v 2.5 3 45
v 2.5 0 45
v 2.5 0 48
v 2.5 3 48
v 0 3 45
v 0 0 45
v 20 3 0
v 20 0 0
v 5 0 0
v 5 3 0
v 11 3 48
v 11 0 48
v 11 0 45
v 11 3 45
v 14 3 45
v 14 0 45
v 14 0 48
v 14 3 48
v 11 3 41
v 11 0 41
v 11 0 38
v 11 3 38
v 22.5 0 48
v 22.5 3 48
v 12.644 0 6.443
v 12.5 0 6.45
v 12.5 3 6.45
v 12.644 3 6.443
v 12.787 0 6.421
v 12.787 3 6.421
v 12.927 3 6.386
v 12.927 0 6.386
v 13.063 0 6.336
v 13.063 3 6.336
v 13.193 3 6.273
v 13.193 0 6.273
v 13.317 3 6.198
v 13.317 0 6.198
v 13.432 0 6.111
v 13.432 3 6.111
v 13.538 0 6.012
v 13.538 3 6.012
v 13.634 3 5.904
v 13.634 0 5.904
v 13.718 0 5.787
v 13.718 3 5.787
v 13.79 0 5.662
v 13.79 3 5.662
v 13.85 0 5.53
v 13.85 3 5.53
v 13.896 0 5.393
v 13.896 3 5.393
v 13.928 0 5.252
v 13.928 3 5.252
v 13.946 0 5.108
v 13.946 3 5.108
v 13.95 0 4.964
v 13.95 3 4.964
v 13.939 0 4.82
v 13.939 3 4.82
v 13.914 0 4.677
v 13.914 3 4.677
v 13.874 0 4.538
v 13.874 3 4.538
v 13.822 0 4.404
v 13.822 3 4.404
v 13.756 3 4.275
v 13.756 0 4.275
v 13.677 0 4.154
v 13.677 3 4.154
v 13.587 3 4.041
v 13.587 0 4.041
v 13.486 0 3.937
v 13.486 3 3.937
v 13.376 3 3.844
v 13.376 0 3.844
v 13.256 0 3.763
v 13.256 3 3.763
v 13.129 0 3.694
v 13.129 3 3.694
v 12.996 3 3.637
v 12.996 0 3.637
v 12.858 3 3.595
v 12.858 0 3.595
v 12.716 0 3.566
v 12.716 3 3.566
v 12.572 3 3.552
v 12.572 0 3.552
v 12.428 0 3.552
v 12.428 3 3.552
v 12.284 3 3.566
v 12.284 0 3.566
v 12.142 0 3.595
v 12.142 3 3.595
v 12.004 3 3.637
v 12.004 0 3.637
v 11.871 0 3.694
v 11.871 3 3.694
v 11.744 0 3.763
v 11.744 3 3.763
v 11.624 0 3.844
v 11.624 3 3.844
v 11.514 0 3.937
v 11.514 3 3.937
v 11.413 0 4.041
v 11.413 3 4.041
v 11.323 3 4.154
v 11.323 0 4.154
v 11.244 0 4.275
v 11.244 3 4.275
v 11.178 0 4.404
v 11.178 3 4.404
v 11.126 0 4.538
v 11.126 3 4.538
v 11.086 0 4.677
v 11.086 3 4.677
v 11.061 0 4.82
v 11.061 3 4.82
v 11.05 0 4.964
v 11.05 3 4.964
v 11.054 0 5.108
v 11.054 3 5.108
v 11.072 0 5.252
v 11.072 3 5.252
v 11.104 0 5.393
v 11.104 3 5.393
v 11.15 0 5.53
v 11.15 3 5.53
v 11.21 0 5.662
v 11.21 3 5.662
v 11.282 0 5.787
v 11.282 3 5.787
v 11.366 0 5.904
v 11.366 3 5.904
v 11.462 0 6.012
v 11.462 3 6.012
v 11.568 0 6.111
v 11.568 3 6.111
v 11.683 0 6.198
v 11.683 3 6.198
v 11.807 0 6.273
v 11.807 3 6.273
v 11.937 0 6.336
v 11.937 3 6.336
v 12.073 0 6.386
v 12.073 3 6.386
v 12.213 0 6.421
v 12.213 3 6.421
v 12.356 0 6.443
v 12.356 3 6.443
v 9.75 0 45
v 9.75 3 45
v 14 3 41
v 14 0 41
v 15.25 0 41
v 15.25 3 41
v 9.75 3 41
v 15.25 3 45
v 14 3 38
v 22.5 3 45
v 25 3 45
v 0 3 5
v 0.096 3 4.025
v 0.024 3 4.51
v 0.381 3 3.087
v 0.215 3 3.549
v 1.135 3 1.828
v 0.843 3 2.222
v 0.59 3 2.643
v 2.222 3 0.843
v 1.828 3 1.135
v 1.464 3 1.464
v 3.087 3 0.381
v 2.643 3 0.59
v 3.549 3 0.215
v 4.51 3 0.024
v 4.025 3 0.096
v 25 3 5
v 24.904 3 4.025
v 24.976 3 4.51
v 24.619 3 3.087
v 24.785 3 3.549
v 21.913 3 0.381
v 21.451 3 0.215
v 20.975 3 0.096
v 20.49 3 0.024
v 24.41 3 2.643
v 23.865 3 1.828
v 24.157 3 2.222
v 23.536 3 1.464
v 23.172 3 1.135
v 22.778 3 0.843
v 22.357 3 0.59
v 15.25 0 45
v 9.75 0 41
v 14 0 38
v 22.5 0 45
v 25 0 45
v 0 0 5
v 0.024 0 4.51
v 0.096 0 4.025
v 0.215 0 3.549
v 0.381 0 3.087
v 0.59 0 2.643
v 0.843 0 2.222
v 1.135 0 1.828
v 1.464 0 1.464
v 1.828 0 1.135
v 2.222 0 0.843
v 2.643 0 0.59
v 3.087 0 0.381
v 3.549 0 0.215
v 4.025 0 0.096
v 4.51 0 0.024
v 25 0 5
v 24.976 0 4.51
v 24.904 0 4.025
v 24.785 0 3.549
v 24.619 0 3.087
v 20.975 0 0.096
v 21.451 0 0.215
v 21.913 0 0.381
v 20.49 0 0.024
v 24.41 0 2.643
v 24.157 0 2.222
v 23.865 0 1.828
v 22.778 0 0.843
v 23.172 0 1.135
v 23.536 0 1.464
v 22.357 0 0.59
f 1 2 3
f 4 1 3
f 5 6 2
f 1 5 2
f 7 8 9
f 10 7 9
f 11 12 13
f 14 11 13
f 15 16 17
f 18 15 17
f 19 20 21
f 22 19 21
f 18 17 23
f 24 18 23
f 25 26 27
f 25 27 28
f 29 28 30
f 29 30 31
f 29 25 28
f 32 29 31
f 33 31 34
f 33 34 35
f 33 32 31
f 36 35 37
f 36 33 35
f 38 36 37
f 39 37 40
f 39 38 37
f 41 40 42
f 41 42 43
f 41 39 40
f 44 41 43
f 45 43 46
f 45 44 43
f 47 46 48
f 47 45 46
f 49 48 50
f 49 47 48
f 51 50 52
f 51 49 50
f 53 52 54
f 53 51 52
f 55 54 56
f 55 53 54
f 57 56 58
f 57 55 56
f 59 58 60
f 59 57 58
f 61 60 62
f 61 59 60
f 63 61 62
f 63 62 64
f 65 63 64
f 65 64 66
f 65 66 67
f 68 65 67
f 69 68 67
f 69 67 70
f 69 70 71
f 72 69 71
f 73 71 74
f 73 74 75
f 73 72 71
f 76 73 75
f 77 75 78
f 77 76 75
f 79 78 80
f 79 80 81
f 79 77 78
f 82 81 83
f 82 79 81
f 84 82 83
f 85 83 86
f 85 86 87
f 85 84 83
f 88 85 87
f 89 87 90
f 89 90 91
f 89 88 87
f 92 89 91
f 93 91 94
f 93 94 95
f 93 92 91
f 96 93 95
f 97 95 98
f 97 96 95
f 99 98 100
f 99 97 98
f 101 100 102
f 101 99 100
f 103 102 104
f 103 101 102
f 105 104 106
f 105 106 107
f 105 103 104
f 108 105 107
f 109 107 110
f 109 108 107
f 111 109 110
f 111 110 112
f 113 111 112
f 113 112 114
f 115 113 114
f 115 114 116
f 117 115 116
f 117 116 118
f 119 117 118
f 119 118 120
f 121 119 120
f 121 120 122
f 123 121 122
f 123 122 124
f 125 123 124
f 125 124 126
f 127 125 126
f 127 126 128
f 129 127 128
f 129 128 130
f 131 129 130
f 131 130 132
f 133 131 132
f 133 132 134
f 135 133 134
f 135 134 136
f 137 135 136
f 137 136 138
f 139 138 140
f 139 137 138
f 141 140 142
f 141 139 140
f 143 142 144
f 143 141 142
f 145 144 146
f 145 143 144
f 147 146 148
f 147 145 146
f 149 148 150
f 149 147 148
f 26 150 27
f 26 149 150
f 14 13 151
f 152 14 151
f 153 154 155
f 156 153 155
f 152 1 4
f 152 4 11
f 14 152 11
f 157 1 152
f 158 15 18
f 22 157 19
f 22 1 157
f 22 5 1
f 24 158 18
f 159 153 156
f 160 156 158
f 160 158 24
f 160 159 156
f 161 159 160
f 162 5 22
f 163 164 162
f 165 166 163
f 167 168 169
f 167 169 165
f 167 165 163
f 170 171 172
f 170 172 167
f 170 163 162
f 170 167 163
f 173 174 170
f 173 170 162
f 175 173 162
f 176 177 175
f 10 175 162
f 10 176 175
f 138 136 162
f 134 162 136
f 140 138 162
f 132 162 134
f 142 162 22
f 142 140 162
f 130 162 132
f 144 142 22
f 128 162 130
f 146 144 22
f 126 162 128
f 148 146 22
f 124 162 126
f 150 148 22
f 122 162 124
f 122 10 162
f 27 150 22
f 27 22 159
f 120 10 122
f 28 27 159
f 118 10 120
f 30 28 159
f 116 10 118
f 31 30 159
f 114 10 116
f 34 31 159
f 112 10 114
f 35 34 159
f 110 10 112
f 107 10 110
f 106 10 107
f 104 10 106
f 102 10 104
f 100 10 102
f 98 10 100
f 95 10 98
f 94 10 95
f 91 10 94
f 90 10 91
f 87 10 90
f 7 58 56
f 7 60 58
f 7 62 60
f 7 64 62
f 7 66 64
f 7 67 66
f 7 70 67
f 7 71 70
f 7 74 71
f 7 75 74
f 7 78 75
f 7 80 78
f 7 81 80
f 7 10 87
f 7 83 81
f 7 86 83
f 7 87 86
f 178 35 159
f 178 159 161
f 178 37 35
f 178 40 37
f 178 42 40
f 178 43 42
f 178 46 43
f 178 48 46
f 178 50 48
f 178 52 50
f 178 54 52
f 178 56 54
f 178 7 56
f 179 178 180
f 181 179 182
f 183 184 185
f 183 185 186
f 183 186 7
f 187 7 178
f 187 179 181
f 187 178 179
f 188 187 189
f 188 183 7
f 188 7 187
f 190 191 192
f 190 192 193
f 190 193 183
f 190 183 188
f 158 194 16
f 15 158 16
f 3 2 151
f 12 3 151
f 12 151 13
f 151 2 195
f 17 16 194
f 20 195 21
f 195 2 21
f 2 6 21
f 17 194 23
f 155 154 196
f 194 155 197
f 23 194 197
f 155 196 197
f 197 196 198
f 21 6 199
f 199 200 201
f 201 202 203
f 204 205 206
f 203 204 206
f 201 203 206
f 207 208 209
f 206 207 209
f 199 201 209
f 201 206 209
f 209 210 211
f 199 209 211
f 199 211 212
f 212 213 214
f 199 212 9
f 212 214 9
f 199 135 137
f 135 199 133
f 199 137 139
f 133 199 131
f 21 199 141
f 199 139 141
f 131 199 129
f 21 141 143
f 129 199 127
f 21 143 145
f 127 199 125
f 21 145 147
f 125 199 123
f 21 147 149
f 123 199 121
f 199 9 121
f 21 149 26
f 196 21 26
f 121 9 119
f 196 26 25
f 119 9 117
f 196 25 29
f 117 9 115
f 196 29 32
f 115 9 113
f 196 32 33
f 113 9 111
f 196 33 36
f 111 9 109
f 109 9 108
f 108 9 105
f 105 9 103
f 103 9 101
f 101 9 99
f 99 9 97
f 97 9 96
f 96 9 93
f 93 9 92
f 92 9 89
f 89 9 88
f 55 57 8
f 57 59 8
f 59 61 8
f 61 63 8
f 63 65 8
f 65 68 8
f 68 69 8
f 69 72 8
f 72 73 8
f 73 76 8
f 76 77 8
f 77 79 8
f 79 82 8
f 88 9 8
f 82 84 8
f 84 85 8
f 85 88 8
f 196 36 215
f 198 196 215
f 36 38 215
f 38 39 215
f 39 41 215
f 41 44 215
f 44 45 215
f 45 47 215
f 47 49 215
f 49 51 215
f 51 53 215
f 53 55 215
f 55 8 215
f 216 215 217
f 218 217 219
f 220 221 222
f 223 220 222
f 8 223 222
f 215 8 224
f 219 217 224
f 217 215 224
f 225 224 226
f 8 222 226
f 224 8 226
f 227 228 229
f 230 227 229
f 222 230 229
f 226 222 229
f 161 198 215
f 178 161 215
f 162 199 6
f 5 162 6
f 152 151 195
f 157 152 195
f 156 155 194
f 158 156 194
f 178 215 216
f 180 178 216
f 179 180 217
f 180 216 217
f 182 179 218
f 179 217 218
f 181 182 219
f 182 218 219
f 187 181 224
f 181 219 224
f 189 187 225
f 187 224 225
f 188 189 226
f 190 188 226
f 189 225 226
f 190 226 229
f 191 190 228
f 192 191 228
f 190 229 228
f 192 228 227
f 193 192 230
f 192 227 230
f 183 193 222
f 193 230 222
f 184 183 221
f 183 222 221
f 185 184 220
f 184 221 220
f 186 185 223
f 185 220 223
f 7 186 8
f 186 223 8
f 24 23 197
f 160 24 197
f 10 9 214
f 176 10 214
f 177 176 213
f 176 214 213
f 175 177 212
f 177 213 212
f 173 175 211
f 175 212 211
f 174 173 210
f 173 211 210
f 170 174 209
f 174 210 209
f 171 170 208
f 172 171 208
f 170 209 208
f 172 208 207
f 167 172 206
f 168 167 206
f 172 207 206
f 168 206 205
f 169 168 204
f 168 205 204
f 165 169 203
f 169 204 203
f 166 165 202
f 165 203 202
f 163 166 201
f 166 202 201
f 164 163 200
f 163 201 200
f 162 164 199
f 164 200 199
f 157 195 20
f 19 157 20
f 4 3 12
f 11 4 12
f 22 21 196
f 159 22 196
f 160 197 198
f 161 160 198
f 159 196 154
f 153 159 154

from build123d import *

# Parameters (mm, degrees)
SKETCH_1_R      = 1.45
EXTRUDE_1_DEPTH = 3


with BuildPart() as part:
    # 草图1 → 凸台-拉伸1 (new body)
    # profile 1 of 3: a face of its own
    with BuildSketch(Plane(origin=(0, 0, 0), x_dir=(1, 0, 0), z_dir=(0, 1, 0))):
        with BuildLine():
            Line((20, 0), (5, 0))
            ThreePointArc((5, 0), (1.464466094, -1.464466094), (0, -5))
            Line((0, -5), (0, -45))
            Line((0, -45), (2.5, -45))
            Line((2.5, -45), (9.75, -45))
            Line((9.75, -45), (9.75, -41))
            Line((9.75, -41), (11, -41))
            Line((11, -41), (11, -38))
            Line((11, -38), (14, -38))
            Line((14, -38), (14, -41))
            Line((14, -41), (15.25, -41))
            Line((15.25, -41), (15.25, -45))
            Line((15.25, -45), (22.5, -45))
            Line((22.5, -45), (25, -45))
            Line((25, -45), (25, -5))
            ThreePointArc((25, -5), (23.535533906, -1.464466094), (20, 0))
        make_face()
        with Locations(Location((12.5, -5, 0), (0, 0, 270))):
            Circle(SKETCH_1_R, mode=Mode.SUBTRACT)
    # profile 2 of 3: a face of its own
    with BuildSketch(Plane(origin=(0, 0, 0), x_dir=(1, 0, 0), z_dir=(0, 1, 0))):
        Polygon((22.5, -48), (22.5, -45), (15.25, -45), (14, -45), (14, -48), align=None)
    # profile 3 of 3: a face of its own
    with BuildSketch(Plane(origin=(0, 0, 0), x_dir=(1, 0, 0), z_dir=(0, 1, 0))):
        Polygon((9.75, -45), (2.5, -45), (2.5, -48), (11, -48), (11, -45), align=None)
    extrude(amount=EXTRUDE_1_DEPTH)


solid = part.part
